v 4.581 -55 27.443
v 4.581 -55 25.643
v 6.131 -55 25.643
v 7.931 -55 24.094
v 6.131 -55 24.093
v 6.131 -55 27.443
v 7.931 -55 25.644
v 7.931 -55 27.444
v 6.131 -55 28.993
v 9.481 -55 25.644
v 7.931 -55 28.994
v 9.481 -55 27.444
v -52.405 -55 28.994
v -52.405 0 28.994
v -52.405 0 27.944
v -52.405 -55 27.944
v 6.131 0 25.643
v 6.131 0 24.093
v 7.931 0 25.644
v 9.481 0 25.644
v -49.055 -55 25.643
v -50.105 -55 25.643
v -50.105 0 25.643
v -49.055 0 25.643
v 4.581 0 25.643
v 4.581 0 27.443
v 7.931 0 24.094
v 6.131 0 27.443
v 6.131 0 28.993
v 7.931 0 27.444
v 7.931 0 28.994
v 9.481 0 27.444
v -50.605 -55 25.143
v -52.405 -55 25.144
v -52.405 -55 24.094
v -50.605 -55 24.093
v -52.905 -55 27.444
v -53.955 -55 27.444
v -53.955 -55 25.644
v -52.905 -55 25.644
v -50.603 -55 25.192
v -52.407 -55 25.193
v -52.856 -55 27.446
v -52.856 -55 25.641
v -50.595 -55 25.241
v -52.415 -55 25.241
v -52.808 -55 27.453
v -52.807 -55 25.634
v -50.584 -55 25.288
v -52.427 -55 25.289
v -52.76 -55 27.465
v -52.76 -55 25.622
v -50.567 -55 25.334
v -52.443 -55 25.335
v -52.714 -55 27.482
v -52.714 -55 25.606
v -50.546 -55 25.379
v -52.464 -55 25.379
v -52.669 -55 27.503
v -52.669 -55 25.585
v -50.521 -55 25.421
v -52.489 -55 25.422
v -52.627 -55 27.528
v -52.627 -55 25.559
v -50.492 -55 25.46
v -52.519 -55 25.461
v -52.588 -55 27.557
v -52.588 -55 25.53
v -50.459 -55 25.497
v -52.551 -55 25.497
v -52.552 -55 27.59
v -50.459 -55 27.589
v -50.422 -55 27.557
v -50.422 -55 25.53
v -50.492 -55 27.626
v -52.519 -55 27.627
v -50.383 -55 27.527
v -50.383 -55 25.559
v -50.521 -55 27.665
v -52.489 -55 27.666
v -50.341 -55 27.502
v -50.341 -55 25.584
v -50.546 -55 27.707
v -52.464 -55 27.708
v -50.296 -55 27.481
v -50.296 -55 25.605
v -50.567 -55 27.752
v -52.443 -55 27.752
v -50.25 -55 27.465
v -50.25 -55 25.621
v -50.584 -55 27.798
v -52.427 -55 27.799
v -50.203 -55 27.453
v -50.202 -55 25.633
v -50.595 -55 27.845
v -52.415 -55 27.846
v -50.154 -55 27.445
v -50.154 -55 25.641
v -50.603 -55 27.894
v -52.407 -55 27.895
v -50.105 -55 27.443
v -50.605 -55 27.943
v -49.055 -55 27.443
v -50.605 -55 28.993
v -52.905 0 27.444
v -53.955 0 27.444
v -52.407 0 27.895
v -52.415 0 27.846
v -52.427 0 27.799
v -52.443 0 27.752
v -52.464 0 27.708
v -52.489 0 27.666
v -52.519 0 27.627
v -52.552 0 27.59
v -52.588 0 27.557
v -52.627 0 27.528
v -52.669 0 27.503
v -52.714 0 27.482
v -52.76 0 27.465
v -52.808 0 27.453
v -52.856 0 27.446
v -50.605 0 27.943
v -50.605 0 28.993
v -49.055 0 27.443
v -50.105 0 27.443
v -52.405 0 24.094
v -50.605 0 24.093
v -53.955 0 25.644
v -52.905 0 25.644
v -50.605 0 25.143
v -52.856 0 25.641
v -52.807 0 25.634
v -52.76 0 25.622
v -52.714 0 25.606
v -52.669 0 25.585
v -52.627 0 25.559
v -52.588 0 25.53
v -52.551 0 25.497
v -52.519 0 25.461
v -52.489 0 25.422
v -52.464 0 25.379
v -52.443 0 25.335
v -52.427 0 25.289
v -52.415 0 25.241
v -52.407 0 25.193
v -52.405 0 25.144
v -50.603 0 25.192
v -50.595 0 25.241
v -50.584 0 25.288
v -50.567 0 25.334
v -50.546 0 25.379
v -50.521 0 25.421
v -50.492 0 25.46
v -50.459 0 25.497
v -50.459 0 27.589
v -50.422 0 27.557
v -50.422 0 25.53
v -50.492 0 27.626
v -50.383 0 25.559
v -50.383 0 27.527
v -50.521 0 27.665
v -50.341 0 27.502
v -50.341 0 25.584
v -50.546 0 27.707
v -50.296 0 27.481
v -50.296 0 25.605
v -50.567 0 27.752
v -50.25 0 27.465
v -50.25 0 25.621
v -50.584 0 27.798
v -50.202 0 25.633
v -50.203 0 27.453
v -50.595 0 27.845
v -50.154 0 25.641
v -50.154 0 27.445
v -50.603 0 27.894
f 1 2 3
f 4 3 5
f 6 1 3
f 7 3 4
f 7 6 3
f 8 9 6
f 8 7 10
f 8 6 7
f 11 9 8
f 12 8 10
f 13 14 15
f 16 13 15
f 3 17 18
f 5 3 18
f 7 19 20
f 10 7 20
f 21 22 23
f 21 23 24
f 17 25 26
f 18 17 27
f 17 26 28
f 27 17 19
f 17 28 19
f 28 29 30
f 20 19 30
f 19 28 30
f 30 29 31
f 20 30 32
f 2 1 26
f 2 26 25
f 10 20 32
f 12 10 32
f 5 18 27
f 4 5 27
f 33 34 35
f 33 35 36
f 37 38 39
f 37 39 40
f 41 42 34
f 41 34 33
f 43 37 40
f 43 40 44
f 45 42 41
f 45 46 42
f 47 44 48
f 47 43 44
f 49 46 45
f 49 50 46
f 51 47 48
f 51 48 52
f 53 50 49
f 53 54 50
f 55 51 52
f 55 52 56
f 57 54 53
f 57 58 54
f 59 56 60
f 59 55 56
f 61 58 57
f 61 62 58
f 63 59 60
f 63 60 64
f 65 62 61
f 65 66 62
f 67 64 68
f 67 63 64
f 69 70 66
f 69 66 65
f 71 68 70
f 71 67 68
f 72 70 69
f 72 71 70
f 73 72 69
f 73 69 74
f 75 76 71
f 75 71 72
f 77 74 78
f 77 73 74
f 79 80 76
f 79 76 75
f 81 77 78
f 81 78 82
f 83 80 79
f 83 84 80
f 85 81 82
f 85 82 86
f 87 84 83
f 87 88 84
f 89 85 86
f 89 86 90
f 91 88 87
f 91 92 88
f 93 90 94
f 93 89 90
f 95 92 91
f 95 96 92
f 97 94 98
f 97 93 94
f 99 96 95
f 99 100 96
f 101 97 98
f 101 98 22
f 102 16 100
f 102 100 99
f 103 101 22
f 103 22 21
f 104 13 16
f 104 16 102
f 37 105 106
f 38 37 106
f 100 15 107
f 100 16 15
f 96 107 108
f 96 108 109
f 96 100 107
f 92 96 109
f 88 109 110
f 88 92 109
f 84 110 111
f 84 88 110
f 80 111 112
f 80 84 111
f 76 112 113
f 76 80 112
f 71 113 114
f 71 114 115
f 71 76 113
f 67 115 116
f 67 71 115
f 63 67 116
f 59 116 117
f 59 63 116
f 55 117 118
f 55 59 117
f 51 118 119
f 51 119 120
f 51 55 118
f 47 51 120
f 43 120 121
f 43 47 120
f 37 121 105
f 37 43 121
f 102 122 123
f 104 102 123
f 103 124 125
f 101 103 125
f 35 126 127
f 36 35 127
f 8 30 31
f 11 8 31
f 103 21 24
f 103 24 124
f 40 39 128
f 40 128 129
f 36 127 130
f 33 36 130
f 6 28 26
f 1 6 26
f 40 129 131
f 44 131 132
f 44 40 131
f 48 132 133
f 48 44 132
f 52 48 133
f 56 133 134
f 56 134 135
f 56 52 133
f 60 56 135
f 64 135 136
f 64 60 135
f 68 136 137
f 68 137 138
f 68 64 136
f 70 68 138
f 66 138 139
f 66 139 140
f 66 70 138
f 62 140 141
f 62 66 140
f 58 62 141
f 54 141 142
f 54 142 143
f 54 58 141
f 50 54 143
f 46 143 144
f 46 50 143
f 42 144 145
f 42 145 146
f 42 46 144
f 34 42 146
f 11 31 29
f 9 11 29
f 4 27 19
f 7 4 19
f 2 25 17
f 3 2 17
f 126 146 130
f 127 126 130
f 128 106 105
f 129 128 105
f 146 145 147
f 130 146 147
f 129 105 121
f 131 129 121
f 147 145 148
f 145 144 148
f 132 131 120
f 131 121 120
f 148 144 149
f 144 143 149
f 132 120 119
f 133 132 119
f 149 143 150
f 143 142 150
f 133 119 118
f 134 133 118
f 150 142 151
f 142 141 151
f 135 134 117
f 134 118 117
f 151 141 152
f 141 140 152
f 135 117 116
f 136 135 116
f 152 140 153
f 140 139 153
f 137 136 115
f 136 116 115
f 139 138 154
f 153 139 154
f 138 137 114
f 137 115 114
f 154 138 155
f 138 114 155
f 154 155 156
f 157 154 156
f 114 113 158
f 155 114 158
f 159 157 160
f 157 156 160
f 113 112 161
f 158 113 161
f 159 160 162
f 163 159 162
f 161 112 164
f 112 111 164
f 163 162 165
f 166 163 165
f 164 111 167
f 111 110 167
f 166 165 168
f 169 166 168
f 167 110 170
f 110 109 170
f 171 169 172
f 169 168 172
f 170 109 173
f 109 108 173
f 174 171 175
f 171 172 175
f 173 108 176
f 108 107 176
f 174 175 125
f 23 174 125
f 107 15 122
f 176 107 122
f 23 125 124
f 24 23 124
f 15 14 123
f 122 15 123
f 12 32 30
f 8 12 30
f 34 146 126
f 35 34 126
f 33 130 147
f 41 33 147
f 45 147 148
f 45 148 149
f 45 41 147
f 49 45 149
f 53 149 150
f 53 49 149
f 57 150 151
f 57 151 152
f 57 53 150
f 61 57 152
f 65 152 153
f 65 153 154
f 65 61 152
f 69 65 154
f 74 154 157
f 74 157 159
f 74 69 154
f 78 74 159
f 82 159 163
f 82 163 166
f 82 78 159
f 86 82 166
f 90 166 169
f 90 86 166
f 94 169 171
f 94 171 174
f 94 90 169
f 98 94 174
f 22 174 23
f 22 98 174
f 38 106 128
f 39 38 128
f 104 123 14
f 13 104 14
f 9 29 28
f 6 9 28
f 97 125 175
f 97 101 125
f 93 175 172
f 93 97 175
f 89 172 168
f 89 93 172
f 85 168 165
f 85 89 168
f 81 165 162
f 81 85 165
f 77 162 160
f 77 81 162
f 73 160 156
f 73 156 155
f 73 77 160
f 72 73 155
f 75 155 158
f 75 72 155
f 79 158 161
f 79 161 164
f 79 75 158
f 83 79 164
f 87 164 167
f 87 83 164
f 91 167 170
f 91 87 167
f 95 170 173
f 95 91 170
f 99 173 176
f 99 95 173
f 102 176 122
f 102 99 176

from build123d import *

# Parameters (mm, degrees)
F1_DEPTH = 55
F2_R     = 0.5


with BuildPart() as f1:
    # F0 (on Front) → F1 (new body)
    with BuildSketch(Plane.XZ):
        Polygon((-49.0550526943, 25.6427074619), (-49.0550526943, 27.442707344), (-50.6050526943, 27.4431348655), (-50.6050526943, 25.6431349835), align=None)
        Polygon((-50.6050526943, 25.6431349835), (-50.6050526943, 27.4431348655), (-52.4050526943, 27.4436313422), (-52.4050526943, 25.6436314601), align=None)
        Polygon((-52.4050526943, 27.4436313422), (-50.6050526943, 27.4431348655), (-50.6050526943, 28.9931349245), (-52.4050526943, 28.9936314011), align=None)
        Polygon((-52.4050526943, 25.6436314601), (-52.4050526943, 27.4436313422), (-53.9550526943, 27.4440588637), (-53.9550526943, 25.6440589817), align=None)
        Polygon((-50.6050526943, 24.0931349245), (-50.6050526943, 25.6431349835), (-52.4050526943, 25.6436314601), (-52.4050526943, 24.0936314011), align=None)
    extrude(amount=F1_DEPTH)

    # F2
    f2_edges = [f1.edges().sort_by_distance(p)[0] for p in [
        (-50.605053, -27.5, 27.443135),
        (-50.605053, -27.5, 25.643135),
        (-52.405053, -27.5, 27.443631),
        (-52.405053, -27.5, 25.643631),
    ]]
    fillet(f2_edges, radius=F2_R)


with BuildPart() as f1b:
    # F0 (on Front) → F1, piece 2 (new body)
    with BuildSketch(Plane.XZ):
        Polygon((9.4811289515, 25.6440589817), (9.4811289515, 27.4440588637), (7.9311289515, 27.4436313422), (7.9311289515, 25.6436314601), align=None)
        Polygon((6.1311289515, 27.4431348655), (7.9311289515, 27.4436313422), (7.9311289515, 28.9936314011), (6.1311289515, 28.9931349245), align=None)
        Polygon((7.9311289515, 25.6436314601), (7.9311289515, 27.4436313422), (6.1311289515, 27.4431348655), (6.1311289515, 25.6431349835), align=None)
        Polygon((7.9311289515, 24.0936314011), (7.9311289515, 25.6436314601), (6.1311289515, 25.6431349835), (6.1311289515, 24.0931349245), align=None)
        Polygon((6.1311289515, 25.6431349835), (6.1311289515, 27.4431348655), (4.5811289515, 27.442707344), (4.5811289515, 25.6427074619), align=None)
    extrude(amount=F1_DEPTH)


solid = Compound([f1.part, f1b.part])
